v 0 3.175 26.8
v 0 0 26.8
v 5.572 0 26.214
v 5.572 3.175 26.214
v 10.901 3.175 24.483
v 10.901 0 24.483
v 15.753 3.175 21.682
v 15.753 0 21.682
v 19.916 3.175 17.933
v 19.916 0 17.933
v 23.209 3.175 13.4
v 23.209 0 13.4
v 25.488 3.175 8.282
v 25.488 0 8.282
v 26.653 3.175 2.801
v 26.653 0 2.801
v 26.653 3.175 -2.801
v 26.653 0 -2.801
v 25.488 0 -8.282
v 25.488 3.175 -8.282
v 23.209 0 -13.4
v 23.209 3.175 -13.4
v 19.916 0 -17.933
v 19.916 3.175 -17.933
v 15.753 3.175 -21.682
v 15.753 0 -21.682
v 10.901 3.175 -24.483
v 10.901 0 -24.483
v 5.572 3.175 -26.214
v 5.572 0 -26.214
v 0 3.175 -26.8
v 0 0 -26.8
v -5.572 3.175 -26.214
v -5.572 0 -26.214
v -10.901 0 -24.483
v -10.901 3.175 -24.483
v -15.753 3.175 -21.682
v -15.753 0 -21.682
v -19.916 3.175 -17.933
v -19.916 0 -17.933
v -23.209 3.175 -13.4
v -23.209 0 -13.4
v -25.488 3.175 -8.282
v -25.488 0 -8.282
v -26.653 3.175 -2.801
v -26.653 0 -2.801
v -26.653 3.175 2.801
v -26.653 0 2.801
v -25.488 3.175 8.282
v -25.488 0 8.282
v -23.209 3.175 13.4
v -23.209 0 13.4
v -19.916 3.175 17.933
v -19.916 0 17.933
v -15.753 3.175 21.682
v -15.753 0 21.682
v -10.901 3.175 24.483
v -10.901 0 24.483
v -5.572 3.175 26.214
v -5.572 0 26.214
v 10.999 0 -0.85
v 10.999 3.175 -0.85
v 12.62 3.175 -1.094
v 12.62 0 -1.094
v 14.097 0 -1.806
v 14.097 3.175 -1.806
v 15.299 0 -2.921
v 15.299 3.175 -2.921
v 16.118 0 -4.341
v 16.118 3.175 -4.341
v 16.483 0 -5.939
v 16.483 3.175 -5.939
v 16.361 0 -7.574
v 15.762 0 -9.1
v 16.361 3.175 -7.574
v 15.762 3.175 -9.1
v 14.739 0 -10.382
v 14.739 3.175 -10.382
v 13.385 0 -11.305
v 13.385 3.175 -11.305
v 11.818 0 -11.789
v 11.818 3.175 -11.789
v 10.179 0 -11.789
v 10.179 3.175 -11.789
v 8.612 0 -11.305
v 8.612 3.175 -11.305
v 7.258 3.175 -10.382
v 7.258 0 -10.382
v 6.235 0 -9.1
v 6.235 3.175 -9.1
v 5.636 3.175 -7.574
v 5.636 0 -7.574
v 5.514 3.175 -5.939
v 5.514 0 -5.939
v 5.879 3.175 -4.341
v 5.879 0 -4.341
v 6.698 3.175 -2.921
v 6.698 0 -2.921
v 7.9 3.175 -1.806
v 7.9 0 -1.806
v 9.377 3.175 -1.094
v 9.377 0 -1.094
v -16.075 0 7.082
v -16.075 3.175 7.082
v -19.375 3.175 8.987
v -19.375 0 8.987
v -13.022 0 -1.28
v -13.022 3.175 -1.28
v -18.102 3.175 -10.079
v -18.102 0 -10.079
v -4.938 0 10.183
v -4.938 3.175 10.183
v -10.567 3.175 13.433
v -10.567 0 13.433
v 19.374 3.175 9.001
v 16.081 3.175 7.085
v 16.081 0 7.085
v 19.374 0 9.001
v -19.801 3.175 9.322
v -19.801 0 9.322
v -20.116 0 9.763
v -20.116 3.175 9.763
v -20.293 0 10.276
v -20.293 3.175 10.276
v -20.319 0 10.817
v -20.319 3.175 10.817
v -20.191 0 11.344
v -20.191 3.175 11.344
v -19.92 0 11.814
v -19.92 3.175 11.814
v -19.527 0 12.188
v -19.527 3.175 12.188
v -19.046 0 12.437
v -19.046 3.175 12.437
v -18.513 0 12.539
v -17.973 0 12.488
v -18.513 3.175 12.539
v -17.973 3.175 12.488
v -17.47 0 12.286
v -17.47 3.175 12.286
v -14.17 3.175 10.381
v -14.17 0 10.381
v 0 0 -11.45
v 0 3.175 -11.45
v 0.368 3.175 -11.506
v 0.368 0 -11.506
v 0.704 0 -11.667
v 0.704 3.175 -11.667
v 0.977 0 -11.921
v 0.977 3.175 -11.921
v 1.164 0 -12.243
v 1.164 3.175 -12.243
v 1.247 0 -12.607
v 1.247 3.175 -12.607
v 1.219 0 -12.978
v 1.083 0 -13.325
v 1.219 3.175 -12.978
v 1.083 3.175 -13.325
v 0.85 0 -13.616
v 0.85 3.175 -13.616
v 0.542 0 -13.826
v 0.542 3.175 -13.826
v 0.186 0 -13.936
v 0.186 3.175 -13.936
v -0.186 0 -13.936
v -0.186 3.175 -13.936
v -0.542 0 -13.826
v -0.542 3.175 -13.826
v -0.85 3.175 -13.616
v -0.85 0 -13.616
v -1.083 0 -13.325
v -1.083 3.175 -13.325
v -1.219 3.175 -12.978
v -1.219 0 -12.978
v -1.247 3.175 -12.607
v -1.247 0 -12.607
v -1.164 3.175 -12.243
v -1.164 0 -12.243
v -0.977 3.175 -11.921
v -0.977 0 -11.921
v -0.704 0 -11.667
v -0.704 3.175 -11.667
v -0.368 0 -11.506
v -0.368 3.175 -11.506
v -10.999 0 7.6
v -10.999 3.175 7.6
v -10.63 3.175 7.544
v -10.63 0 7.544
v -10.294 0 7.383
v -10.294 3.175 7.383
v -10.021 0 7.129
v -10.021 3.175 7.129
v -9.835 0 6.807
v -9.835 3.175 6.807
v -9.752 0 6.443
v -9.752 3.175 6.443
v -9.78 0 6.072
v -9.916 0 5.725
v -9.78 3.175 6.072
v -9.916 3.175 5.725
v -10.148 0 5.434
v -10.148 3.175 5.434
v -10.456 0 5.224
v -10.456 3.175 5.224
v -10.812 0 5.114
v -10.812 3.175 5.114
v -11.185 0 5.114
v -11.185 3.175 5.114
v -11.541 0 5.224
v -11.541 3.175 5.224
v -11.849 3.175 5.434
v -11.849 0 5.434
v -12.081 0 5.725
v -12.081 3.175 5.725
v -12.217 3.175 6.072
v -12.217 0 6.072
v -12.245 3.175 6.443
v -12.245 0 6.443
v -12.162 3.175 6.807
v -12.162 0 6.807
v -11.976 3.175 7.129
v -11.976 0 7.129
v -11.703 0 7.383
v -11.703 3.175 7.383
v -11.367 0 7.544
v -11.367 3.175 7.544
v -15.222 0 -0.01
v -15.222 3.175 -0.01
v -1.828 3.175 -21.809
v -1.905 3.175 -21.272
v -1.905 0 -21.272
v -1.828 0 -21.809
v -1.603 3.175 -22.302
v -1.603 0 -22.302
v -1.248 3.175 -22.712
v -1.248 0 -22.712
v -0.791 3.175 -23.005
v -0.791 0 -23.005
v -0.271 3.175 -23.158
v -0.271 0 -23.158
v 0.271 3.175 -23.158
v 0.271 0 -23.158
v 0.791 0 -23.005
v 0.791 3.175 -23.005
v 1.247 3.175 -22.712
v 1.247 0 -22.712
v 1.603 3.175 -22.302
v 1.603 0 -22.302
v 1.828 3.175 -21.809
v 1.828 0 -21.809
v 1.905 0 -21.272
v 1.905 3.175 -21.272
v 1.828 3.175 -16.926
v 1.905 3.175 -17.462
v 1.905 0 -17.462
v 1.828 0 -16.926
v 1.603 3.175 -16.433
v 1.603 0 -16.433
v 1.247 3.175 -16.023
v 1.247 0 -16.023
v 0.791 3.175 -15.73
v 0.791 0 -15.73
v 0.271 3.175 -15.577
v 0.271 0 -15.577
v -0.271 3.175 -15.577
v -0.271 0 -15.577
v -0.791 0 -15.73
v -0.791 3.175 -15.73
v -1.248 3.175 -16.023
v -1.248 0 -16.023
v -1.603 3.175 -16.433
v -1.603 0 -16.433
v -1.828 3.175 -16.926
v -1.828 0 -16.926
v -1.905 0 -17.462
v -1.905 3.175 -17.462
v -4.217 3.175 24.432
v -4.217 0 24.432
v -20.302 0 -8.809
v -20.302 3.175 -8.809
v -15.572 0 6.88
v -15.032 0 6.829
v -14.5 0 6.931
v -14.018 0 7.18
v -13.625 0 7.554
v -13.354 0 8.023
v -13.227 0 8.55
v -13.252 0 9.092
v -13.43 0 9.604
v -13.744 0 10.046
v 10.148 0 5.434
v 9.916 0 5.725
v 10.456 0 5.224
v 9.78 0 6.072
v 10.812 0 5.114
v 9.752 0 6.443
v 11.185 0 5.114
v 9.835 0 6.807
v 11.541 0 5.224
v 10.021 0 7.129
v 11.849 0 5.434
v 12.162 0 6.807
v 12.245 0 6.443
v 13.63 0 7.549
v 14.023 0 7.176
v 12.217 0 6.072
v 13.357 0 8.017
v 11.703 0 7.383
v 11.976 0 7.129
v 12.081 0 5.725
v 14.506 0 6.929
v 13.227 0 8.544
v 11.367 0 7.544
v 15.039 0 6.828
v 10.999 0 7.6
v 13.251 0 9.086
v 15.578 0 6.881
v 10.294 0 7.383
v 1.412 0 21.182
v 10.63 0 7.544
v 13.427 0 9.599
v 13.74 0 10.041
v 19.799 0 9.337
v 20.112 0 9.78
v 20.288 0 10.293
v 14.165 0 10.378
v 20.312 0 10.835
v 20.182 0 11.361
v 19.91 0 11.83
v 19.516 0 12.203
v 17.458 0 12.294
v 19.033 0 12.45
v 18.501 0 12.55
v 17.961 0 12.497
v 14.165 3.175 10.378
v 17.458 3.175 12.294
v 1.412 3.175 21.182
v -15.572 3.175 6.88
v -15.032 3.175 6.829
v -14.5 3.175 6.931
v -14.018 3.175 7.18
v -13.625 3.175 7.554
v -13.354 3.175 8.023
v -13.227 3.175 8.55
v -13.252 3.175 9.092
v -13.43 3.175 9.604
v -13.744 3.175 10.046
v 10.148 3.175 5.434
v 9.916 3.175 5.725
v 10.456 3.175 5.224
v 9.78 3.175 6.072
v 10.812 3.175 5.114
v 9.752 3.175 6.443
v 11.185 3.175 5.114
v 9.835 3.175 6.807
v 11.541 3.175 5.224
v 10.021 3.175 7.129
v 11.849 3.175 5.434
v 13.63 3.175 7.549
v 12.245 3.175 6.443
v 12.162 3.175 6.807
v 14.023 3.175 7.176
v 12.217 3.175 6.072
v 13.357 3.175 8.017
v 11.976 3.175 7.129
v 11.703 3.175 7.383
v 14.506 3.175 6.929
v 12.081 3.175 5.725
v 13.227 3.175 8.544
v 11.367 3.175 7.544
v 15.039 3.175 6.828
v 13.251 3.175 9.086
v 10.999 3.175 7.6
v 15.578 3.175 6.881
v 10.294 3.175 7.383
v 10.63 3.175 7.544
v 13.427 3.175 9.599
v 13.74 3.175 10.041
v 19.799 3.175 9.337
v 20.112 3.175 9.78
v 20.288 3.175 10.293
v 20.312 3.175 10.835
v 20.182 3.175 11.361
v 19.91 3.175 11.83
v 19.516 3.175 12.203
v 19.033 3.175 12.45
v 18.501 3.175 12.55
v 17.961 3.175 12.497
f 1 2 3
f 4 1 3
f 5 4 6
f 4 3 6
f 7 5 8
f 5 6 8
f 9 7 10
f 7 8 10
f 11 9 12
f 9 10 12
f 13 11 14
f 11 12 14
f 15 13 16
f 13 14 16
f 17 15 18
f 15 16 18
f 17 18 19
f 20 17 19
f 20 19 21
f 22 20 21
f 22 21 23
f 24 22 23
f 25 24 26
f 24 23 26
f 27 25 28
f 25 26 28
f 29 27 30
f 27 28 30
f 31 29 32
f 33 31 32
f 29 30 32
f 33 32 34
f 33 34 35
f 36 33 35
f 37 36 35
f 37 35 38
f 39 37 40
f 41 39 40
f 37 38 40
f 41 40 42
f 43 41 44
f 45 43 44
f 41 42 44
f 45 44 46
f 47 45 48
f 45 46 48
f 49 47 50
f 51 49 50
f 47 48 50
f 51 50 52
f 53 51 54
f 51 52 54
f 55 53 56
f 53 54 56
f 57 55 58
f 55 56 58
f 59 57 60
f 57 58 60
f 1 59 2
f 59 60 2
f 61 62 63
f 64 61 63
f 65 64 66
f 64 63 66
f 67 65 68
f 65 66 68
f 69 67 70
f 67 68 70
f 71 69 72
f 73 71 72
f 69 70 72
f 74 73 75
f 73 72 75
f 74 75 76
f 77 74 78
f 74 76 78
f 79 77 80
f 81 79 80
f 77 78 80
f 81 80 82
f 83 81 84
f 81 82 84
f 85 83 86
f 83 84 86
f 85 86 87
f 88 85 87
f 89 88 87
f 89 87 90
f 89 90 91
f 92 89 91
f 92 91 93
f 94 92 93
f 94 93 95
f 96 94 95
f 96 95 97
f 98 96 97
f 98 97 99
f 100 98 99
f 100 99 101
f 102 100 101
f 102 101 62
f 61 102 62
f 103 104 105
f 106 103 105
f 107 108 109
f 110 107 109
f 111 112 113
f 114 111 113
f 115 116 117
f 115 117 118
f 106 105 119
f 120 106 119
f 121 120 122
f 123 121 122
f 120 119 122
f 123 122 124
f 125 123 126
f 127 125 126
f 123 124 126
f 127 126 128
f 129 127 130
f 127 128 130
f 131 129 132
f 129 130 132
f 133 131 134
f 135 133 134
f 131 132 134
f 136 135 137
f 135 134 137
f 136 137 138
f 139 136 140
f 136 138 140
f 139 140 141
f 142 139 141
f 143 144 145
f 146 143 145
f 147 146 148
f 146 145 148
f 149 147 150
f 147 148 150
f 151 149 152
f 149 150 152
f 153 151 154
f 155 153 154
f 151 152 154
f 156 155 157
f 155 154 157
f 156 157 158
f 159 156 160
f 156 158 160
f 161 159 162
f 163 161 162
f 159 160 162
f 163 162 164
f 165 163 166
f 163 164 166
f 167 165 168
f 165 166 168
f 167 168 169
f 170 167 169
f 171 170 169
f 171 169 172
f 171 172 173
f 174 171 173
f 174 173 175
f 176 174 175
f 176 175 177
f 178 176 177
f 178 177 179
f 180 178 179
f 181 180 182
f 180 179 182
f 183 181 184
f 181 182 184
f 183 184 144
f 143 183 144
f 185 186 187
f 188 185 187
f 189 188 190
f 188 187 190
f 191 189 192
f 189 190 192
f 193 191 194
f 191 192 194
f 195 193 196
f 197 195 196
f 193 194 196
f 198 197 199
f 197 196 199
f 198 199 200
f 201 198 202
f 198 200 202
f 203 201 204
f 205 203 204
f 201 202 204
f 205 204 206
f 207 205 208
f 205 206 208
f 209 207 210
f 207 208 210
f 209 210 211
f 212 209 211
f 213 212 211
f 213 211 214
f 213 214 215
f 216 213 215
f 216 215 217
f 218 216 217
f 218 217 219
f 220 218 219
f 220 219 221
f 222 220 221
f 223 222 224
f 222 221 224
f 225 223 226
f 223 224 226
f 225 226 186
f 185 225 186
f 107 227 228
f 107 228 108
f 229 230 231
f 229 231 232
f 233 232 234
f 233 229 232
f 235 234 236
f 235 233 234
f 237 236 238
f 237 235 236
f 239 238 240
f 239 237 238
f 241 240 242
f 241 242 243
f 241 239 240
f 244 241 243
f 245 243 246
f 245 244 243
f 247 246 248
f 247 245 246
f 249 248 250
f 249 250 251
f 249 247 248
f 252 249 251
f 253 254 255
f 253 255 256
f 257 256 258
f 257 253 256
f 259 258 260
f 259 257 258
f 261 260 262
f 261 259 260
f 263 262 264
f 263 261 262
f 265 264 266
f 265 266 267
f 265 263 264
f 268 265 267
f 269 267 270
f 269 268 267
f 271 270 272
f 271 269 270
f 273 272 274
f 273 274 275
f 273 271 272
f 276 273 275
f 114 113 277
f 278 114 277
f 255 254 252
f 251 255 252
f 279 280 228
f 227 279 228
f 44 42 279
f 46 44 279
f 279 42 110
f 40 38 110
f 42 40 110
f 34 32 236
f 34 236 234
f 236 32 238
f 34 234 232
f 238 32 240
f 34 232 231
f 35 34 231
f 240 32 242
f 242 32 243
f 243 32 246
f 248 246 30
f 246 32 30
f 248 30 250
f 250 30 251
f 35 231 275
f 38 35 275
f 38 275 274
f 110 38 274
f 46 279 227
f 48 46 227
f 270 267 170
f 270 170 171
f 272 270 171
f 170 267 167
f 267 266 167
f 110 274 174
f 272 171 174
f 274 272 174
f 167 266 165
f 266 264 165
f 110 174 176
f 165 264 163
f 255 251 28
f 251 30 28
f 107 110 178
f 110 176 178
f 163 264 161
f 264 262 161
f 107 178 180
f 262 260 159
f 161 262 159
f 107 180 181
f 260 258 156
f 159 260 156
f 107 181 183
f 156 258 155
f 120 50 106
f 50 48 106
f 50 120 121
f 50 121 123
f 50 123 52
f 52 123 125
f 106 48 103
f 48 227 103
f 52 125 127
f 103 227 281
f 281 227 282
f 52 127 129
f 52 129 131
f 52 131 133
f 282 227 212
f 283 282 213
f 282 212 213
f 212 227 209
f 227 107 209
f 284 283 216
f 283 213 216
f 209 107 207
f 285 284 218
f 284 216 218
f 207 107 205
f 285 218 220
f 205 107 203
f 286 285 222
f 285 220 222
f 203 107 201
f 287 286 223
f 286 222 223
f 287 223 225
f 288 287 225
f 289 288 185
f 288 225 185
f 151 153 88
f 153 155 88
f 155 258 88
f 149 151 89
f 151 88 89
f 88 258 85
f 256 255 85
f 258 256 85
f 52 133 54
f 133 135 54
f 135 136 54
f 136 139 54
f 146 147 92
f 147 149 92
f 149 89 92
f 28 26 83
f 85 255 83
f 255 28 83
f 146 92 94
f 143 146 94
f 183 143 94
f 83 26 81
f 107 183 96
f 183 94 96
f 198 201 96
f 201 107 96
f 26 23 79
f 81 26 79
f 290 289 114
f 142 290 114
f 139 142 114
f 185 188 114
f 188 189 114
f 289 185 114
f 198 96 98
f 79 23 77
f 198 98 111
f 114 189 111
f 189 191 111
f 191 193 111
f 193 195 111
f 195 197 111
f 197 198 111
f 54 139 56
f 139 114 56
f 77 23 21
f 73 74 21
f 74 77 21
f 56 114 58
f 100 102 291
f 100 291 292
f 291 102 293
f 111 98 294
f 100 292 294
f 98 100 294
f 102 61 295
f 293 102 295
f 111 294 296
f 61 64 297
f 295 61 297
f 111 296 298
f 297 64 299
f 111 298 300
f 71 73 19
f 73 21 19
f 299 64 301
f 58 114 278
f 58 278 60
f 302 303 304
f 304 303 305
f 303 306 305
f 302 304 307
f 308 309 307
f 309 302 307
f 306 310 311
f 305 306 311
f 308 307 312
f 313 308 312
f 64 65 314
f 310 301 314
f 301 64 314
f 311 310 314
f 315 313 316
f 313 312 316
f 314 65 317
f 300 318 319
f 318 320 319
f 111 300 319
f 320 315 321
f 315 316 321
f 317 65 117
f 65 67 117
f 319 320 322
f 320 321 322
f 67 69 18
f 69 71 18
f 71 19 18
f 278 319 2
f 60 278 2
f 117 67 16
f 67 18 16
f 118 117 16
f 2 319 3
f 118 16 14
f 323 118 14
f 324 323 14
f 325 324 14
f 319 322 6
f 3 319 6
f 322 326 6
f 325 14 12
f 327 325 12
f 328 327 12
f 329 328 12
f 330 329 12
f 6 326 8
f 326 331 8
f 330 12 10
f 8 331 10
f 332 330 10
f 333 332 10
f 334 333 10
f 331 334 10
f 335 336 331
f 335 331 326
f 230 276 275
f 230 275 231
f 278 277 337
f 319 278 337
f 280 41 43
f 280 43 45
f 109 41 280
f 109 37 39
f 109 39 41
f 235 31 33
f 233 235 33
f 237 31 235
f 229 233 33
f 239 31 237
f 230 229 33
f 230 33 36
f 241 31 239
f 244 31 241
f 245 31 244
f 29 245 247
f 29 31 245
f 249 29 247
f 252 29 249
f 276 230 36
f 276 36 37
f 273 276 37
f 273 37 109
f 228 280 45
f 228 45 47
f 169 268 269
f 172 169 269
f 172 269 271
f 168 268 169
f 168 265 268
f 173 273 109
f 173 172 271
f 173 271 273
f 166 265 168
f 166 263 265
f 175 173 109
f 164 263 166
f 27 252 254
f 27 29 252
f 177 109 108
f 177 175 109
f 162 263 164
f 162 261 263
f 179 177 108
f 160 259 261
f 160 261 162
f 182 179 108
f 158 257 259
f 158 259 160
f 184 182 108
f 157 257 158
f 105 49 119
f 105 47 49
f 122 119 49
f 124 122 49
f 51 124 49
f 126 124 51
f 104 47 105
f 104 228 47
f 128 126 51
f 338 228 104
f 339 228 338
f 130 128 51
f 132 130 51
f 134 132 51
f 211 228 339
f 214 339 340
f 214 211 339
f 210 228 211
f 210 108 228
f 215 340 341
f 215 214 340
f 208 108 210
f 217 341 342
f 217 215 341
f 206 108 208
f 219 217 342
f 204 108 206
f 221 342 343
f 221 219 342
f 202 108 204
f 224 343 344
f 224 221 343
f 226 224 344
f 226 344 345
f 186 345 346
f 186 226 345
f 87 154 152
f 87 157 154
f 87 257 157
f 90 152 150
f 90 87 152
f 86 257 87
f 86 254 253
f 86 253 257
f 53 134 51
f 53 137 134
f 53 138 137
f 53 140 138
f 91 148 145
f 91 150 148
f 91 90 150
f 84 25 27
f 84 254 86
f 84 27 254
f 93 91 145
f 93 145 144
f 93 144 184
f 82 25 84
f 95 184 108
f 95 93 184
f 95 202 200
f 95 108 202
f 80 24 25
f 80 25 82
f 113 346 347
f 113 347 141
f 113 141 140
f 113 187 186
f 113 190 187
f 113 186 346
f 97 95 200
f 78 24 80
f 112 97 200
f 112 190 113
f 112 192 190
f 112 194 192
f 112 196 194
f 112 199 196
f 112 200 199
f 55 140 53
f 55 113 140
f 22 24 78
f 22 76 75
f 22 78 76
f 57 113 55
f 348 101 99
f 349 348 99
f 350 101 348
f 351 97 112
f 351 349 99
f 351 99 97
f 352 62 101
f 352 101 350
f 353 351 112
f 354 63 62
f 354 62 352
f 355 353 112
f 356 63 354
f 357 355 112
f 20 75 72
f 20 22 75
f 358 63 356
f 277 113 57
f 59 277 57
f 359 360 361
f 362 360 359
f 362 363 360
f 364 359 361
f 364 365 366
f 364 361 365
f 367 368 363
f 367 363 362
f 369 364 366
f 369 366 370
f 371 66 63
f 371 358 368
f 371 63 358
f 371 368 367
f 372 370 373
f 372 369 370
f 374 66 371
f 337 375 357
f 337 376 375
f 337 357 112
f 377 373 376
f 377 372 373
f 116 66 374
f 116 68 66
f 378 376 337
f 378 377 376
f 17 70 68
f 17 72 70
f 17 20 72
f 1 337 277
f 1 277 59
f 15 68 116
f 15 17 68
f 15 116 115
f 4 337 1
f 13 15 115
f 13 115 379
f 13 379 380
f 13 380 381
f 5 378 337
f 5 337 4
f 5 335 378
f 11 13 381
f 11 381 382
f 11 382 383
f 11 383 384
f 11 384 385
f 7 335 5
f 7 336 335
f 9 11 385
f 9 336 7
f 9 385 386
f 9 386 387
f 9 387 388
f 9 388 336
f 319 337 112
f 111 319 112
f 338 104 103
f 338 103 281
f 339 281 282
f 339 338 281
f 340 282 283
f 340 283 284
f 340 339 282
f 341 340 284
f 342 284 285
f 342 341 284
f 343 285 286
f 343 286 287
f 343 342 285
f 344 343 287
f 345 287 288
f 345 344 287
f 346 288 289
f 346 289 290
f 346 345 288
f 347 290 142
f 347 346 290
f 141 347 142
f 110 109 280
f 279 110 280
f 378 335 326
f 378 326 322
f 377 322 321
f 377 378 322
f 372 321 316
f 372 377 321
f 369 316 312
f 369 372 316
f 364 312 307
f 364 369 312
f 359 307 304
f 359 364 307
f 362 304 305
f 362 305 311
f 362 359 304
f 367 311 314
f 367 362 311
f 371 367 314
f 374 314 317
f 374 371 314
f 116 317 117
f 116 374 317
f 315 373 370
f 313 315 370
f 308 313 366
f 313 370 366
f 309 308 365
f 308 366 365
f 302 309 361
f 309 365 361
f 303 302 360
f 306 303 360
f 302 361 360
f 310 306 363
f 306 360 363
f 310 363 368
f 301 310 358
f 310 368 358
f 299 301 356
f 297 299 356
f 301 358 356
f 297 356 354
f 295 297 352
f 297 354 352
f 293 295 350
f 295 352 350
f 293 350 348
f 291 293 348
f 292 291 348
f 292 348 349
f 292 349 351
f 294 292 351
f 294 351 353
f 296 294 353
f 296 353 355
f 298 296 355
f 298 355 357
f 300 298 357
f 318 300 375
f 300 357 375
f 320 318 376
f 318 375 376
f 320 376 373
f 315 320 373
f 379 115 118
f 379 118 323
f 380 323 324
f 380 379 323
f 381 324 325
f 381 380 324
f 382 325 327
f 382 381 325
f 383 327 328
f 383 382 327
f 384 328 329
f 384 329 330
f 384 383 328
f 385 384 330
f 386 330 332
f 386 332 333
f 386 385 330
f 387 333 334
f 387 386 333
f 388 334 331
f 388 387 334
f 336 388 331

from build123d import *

# Parameters (mm, degrees)
SKETCH2_R           = 26.799999994
BOSS_EXTRUDE1_DEPTH = 3.175
SKETCH3_W           = 3.81
SKETCH3_H           = 3.81
SKETCH3_R           = 1.25
CUT_EXTRUDE1_DEPTH  = 3.175
SKETCH4_R           = 5.5
CUT_EXTRUDE2_DEPTH  = 7.62
CUT_EXTRUDE3_DEPTH  = 5.08


with BuildPart() as part:
    # Sketch2 → Boss-Extrude1 (new body)
    with BuildSketch(Plane(origin=(0, 0, 0), x_dir=(1, 0, 0), z_dir=(0, 1, 0))):
        with Locations(Location((0, 0, 0), (0, 0, 270))):
            Circle(SKETCH2_R)
    extrude(amount=BOSS_EXTRUDE1_DEPTH)

    # Sketch3 → Cut-Extrude1 (cut)
    with BuildSketch(Plane(origin=(0, 3.175, 0), x_dir=(1, 0, 0), z_dir=(0, 1, 0))):
        with Locations((-5e-05, 19.3675)):
            Rectangle(SKETCH3_W, SKETCH3_H)
        with BuildLine():
            ThreePointArc((-1.90505, 21.2725), (-5e-05, 23.1775), (1.90495, 21.2725))
            Line((1.90495, 21.2725), (-1.90505, 21.2725))
        make_face()
        with BuildLine():
            Line((-1.90505, 17.4625), (1.90495, 17.4625))
            ThreePointArc((1.90495, 17.4625), (-5e-05, 15.5575), (-1.90505, 17.4625))
        make_face()
        Polygon((16.0810614, -7.084700603), (19.374239178, -9.000706899), (17.458232881, -12.293884676), (14.165055104, -10.37787838), align=None)
        with BuildLine():
            ThreePointArc((14.165055104, -10.37787838), (13.476469363, -7.773286343), (16.0810614, -7.084700603))
            Line((16.0810614, -7.084700603), (14.165055104, -10.37787838))
        make_face()
        with BuildLine():
            Line((17.458232881, -12.293884676), (19.374239178, -9.000706899))
            ThreePointArc((19.374239178, -9.000706899), (20.062824918, -11.605298935), (17.458232881, -12.293884676))
        make_face()
        Polygon((-14.170405114, -10.381138379), (-16.075405114, -7.081581591), (-19.374961902, -8.986581591), (-17.469961902, -12.286138379), align=None)
        with BuildLine():
            Line((-14.170405114, -10.381138379), (-16.075405114, -7.081581591))
            ThreePointArc((-16.075405114, -7.081581591), (-13.473126719, -7.778859985), (-14.170405114, -10.381138379))
        make_face()
        with BuildLine():
            Line((-17.469961902, -12.286138379), (-19.374961902, -8.986581591))
            ThreePointArc((-19.374961902, -8.986581591), (-20.072240296, -11.588859985), (-17.469961902, -12.286138379))
        make_face()
        with Locations(Location((-10.998522628, -6.35, 0), (0, 0, 270))):
            Circle(SKETCH3_R)
        with Locations(Location((0, 12.7, 0), (0, 0, 270))):
            Circle(SKETCH3_R)
        with Locations(Location((10.998522628, -6.35, 0), (0, 0, 270))):
            Circle(SKETCH3_R)
    extrude(amount=-CUT_EXTRUDE1_DEPTH, mode=Mode.SUBTRACT)

    # Sketch4 → Cut-Extrude2 (cut)
    with BuildSketch(Plane(origin=(0, 3.175, 0), x_dir=(1, 0, 0), z_dir=(0, 1, 0))):
        with Locations(Location((10.998522628, 6.35, 0), (0, 0, 270))):
            Circle(SKETCH4_R)
    extrude(amount=-CUT_EXTRUDE2_DEPTH, mode=Mode.SUBTRACT)

    # Sketch5 → Cut-Extrude3 (cut)
    with BuildSketch(Plane(origin=(0, 3.175, 0), x_dir=(1, 0, 0), z_dir=(0, 1, 0))):
        Polygon((-4.216675415, -24.431543942), (1.41248971, -21.181543942), (-4.93751029, -10.183021314), (-10.566675415, -13.433021314), align=None)
        Polygon((-15.222067079, 0.010353577), (-13.022362553, 1.280353577), (-18.102362553, 10.079171679), (-20.302067079, 8.809171679), align=None)
    extrude(amount=-CUT_EXTRUDE3_DEPTH, mode=Mode.SUBTRACT)


solid = part.part
